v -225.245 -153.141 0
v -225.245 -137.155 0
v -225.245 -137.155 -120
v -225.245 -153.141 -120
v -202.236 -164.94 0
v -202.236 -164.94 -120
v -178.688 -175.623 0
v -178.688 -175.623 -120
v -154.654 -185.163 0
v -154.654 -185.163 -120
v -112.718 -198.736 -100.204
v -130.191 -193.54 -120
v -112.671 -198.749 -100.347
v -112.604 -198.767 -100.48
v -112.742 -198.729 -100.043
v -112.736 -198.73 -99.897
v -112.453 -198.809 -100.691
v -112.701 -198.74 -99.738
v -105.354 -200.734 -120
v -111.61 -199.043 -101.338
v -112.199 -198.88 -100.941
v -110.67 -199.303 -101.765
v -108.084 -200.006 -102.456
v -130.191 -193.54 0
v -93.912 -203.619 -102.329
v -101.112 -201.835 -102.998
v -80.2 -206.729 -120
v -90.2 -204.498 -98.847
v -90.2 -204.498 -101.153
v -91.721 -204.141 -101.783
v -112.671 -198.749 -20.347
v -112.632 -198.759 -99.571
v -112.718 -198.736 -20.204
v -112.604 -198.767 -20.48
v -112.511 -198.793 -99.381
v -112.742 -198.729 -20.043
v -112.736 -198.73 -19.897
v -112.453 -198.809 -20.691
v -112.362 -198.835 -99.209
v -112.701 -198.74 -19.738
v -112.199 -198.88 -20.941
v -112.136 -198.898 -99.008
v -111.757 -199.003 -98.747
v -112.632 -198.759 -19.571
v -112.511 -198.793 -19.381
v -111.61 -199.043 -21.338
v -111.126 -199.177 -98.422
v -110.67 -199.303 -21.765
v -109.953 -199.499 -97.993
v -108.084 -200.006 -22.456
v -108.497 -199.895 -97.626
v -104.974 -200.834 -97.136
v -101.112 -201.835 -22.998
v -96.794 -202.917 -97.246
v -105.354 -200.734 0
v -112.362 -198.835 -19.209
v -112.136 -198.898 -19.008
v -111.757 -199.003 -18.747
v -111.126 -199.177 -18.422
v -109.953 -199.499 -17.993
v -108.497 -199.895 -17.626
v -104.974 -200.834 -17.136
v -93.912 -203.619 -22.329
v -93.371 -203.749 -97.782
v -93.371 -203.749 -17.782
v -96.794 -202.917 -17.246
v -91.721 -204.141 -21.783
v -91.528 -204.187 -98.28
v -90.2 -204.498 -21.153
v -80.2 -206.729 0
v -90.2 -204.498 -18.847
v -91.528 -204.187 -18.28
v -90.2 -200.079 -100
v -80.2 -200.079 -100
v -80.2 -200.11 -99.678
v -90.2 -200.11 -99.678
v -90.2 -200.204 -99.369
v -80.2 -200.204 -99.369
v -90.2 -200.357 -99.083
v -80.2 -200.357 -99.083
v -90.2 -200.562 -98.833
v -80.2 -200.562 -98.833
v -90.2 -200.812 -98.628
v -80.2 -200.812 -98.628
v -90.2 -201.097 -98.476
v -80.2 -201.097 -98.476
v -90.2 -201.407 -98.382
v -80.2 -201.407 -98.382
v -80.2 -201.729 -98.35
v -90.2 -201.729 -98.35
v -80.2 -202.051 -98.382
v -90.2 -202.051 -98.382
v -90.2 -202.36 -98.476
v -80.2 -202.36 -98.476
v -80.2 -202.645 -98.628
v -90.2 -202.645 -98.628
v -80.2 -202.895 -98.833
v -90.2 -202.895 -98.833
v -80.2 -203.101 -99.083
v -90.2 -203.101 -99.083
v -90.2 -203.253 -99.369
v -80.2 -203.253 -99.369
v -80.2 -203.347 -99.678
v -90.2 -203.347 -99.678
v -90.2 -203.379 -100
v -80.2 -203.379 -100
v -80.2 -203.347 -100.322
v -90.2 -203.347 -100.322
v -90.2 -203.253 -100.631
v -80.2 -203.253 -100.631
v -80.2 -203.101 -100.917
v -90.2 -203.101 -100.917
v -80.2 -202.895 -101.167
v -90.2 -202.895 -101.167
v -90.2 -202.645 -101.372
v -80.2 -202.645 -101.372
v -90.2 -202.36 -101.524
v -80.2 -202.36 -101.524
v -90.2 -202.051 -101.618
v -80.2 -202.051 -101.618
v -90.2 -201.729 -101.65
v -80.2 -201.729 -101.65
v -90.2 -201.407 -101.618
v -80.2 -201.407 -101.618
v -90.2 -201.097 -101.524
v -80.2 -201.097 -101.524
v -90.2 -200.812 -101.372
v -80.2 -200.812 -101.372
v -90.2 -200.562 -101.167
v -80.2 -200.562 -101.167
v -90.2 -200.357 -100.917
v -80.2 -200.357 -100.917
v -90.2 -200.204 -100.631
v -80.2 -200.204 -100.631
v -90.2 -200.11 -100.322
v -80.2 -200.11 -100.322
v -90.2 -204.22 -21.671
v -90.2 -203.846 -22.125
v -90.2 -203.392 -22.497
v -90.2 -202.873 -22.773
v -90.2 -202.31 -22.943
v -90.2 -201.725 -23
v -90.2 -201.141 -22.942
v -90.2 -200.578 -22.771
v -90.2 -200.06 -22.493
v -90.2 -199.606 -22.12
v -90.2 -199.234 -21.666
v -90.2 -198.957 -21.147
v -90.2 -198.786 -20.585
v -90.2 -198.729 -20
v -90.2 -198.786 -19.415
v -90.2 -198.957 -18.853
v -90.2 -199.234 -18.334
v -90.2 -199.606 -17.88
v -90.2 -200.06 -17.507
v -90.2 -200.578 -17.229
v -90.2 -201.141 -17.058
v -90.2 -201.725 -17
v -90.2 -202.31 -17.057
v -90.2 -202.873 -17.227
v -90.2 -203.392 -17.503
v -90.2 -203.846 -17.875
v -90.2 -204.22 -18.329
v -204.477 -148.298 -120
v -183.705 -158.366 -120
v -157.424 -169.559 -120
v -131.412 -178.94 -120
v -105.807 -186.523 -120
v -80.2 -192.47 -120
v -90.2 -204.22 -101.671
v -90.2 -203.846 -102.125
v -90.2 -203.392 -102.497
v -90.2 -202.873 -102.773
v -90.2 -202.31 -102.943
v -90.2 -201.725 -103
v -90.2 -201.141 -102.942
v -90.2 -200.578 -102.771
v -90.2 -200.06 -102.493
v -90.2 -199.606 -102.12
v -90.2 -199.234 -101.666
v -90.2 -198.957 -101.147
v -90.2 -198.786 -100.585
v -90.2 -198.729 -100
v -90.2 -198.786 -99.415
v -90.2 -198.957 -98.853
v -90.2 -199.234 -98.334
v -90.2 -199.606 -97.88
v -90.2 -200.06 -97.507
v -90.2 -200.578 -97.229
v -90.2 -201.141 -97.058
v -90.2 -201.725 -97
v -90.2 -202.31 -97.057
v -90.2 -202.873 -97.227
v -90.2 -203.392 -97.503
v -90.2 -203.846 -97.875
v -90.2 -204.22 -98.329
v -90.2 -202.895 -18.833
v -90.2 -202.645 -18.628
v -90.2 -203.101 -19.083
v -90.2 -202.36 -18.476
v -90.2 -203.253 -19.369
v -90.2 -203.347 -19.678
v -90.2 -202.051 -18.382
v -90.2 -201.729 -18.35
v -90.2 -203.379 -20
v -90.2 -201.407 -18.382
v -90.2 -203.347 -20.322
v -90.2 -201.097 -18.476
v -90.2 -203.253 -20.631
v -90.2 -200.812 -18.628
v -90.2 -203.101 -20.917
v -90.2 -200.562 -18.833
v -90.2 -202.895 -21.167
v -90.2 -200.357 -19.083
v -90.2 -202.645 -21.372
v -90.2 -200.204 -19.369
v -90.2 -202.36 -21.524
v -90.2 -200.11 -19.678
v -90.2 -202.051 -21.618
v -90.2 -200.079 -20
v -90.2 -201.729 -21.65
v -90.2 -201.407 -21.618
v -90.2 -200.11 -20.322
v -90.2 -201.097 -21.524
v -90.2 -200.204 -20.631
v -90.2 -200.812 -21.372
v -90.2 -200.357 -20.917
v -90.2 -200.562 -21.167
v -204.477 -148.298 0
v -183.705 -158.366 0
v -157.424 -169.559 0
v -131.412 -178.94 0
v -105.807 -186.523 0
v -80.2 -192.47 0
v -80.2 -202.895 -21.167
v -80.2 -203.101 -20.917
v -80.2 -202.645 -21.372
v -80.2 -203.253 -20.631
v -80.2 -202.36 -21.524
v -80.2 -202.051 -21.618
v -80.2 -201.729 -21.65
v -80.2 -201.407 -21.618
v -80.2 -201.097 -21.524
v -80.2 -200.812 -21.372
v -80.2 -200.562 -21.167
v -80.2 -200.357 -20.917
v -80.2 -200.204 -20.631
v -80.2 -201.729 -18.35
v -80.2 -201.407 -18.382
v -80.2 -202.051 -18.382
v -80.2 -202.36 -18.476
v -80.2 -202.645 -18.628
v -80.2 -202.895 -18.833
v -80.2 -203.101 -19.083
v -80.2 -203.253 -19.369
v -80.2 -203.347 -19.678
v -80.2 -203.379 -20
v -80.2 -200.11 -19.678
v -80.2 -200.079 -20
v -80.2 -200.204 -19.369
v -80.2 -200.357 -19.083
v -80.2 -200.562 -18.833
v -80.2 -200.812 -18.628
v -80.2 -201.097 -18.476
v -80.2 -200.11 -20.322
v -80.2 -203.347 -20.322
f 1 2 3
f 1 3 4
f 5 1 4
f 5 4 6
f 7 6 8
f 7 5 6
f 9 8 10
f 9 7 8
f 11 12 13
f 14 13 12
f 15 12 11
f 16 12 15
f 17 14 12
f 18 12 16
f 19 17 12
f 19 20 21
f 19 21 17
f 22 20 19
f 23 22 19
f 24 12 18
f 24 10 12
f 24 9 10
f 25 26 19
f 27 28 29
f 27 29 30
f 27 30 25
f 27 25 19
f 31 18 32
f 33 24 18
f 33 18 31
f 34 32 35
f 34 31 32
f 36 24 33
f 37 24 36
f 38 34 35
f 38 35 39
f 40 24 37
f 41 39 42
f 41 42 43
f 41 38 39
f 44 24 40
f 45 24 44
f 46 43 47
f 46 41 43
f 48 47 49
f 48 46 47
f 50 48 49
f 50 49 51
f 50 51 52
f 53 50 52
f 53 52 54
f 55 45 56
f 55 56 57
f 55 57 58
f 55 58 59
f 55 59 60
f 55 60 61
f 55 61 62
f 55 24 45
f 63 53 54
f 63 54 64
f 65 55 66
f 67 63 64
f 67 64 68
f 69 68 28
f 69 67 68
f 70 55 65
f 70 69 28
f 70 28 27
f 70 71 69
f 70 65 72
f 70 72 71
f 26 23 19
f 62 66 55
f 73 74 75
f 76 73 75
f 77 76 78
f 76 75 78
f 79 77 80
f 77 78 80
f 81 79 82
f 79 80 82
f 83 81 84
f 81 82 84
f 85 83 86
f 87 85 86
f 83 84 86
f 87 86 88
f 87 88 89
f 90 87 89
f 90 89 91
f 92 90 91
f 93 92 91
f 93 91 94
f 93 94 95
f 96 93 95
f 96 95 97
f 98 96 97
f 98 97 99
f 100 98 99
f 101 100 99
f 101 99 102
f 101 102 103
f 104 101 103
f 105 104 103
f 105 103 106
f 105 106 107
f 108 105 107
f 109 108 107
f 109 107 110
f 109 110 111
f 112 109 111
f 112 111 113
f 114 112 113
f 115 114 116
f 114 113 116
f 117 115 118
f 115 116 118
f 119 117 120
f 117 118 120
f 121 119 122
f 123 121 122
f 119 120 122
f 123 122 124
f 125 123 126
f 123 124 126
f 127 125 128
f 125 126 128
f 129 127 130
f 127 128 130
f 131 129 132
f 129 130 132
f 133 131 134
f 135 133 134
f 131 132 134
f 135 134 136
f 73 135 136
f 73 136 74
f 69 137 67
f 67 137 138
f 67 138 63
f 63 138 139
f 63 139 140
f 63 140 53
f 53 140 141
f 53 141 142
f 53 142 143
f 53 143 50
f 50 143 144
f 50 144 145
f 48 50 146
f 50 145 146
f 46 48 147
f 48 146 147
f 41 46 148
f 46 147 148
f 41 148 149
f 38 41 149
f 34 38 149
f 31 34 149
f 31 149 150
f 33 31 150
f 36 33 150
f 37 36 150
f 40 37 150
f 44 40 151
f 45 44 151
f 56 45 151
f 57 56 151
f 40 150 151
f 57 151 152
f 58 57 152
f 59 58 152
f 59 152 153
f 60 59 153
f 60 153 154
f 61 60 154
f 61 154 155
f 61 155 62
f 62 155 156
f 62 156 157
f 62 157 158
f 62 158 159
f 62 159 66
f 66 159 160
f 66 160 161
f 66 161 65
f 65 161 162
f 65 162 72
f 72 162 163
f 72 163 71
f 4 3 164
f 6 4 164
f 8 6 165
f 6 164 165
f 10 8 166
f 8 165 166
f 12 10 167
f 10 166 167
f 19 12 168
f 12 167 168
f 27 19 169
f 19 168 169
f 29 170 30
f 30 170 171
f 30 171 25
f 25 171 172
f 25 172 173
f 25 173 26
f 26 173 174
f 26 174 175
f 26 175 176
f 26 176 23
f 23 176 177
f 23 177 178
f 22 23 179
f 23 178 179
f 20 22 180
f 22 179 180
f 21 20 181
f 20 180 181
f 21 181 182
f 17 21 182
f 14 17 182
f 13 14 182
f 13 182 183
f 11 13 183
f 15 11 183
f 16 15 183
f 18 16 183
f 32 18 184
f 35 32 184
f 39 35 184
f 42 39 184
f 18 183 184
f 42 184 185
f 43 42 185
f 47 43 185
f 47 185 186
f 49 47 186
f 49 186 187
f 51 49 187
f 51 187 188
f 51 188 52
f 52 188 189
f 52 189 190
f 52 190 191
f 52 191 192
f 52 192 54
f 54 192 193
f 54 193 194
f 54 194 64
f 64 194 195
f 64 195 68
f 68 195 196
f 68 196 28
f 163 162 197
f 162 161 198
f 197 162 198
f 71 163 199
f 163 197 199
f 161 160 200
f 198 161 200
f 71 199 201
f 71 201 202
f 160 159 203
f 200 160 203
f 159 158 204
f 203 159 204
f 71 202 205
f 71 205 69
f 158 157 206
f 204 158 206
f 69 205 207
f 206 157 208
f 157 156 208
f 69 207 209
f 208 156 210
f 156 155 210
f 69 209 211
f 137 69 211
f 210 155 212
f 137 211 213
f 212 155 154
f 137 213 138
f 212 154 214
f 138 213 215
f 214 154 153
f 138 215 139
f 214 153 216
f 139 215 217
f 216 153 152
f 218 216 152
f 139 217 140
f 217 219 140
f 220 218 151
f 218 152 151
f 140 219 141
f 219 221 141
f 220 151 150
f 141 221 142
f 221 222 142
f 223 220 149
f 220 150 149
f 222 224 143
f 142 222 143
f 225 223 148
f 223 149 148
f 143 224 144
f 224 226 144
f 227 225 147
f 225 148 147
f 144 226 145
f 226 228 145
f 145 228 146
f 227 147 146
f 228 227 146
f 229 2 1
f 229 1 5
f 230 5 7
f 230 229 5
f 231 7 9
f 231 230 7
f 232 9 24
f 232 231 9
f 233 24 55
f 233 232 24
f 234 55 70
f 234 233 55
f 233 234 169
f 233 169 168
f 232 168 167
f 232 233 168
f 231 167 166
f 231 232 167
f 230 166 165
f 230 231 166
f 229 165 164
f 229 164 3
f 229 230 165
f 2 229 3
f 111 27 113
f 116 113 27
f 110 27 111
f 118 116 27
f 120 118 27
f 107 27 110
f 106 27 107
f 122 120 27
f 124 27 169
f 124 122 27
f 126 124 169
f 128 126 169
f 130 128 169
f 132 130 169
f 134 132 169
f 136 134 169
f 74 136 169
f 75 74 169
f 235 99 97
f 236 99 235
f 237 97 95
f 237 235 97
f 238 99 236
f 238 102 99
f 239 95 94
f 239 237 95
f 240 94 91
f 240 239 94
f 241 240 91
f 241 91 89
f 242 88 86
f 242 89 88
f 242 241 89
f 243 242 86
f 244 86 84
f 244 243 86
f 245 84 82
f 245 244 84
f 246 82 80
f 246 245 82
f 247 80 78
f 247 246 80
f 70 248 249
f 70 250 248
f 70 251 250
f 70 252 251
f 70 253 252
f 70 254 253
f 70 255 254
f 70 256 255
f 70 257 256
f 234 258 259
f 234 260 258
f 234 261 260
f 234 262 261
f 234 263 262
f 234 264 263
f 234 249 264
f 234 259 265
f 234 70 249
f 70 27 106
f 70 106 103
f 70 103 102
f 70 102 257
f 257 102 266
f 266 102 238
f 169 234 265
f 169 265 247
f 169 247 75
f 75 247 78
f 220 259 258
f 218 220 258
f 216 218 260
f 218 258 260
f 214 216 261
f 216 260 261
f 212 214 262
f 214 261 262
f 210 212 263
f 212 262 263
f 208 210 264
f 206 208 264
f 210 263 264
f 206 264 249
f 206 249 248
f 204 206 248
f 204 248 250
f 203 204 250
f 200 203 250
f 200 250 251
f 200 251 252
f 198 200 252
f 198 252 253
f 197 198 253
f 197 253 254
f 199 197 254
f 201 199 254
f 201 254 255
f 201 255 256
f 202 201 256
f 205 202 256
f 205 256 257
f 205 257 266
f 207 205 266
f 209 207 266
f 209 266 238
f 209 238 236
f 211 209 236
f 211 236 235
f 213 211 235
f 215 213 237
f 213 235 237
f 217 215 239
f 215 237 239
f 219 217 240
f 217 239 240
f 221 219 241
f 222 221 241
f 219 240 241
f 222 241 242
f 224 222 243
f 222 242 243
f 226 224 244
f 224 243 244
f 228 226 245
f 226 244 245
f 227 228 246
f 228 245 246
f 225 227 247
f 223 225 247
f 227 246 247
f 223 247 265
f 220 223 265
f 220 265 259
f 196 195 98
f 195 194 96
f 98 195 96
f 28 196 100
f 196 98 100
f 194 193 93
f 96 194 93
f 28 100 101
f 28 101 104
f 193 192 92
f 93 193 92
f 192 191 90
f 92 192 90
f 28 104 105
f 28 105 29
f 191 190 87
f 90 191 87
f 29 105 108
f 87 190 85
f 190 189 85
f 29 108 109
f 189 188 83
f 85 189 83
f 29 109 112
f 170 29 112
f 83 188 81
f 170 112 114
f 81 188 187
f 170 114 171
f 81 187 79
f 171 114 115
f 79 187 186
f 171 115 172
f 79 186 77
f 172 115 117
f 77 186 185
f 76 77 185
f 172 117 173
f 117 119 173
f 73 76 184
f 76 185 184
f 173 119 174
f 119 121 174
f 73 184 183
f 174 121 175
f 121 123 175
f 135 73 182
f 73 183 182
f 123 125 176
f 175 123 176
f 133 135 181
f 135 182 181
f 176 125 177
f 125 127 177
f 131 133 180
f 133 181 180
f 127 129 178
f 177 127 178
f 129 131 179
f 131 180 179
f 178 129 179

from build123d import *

# Parameters (mm, degrees)
BOSS_EXTRUDE1_DEPTH = 120
SKETCH2_R           = 1.65
CUT_EXTRUDE1_DEPTH  = 280.59760166
SKETCH3_R           = 3
CUT_EXTRUDE2_DEPTH  = 275.54310452


with BuildPart() as part:
    # Sketch1 → Boss-Extrude1 (new body)
    with BuildSketch(Plane.XY):
        with BuildLine():
            Line((-80.2, -206.72863576), (-80.2, -192.469888951))
            add(Edge.make_bspline(
                [(-80.2, -192.469888951), (-81.626071271, -192.184311675), (-92.438149368, -189.961391225), (-112.635650998, -184.99089612), (-140.791197461, -176.082259845), (-164.252323786, -167.009400213), (-183.020628451, -158.761564514), (-197.095113634, -152.081763048), (-208.827276173, -146.10094494), (-218.204067638, -141.07390287), (-222.908176033, -138.469074724), (-225.24513062, -137.154537769)],
                knots=[0.501416014, 0.501416014, 0.501416014, 0.501416014, 0.501491553, 0.501988738, 0.502485922, 0.502983107, 0.503231699, 0.503480291, 0.503728883, 0.50385318, 0.503977476, 0.503977476, 0.503977476, 0.503977476], degree=3))
            Line((-225.24513062, -137.154537769), (-225.24513062, -153.140671849))
            ThreePointArc((-225.24513062, -153.140671849), (-154.65433281, -185.163318021), (-80.2, -206.72863576))
        make_face()
    extrude(amount=-BOSS_EXTRUDE1_DEPTH)

    # Sketch2 → Cut-Extrude1 (cut, through all)
    with BuildSketch(Plane(origin=(-80.2, 0, 0), x_dir=(0, 0, -1), z_dir=(1, 0, 0))):
        with Locations(Location((100, -201.72863576, 0), (0, 0, 90))):
            Circle(SKETCH2_R)
        with Locations(Location((20, -201.72863576, 0), (0, 0, 90))):
            Circle(SKETCH2_R)
    extrude(amount=-CUT_EXTRUDE1_DEPTH, mode=Mode.SUBTRACT)

    # Sketch3 → Cut-Extrude2 (cut, through all)
    with BuildSketch(Plane(origin=(-90.2, 0, 0), x_dir=(0, 0, -1), z_dir=(1, 0, 0))):
        with Locations((100, -201.72863576)):
            Circle(SKETCH3_R)
        with Locations((20, -201.72863576)):
            Circle(SKETCH3_R)
    extrude(amount=-CUT_EXTRUDE2_DEPTH, mode=Mode.SUBTRACT)


solid = part.part
